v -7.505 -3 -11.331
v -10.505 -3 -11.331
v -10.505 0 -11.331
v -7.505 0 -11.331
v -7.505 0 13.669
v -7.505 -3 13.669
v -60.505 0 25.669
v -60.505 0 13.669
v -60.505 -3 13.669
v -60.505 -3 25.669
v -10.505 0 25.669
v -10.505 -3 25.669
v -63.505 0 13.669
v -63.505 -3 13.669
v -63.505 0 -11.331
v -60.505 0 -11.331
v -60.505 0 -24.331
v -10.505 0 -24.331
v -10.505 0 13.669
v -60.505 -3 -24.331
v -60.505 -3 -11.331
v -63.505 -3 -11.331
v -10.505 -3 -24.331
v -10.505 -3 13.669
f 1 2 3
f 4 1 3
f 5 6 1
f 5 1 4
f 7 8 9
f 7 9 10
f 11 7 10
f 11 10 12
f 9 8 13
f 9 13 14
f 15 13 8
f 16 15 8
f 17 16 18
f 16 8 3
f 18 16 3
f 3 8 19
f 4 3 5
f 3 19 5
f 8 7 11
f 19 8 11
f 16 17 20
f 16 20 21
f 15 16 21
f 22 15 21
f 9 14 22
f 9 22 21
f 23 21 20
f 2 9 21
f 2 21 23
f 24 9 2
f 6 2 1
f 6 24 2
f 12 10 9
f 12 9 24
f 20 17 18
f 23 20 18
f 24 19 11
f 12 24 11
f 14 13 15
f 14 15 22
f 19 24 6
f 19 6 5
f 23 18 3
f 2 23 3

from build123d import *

# Parameters (mm, degrees)
F0_W     = 50
F0_H     = 50
F1_DEPTH = 3
F2_W     = 3
F2_H     = 25
F3_DEPTH = 3
F4_W     = 3
F4_H     = 25
F5_DEPTH = 3


with BuildPart() as f1:
    # F0 (on Front) → F1 (new body)
    with BuildSketch(Plane.XZ):
        with Locations((-35.504888, 0.668609)):
            Rectangle(F0_W, F0_H)
    extrude(amount=F1_DEPTH)

    # F2 (on face) → F3 (join)
    with BuildSketch(Plane.YZ.offset(-10.504888)):
        with Locations((-1.5, 1.168609)):
            Rectangle(F2_W, F2_H)
    extrude(amount=F3_DEPTH)

    # F4 (on face) → F5 (join)
    with BuildSketch(Plane(origin=(-60.504888, 0, 0), x_dir=(0, -1, 0), z_dir=(-1, 0, 0))):
        with Locations((1.5, 1.168609)):
            Rectangle(F4_W, F4_H)
    extrude(amount=F5_DEPTH)


solid = f1.part
